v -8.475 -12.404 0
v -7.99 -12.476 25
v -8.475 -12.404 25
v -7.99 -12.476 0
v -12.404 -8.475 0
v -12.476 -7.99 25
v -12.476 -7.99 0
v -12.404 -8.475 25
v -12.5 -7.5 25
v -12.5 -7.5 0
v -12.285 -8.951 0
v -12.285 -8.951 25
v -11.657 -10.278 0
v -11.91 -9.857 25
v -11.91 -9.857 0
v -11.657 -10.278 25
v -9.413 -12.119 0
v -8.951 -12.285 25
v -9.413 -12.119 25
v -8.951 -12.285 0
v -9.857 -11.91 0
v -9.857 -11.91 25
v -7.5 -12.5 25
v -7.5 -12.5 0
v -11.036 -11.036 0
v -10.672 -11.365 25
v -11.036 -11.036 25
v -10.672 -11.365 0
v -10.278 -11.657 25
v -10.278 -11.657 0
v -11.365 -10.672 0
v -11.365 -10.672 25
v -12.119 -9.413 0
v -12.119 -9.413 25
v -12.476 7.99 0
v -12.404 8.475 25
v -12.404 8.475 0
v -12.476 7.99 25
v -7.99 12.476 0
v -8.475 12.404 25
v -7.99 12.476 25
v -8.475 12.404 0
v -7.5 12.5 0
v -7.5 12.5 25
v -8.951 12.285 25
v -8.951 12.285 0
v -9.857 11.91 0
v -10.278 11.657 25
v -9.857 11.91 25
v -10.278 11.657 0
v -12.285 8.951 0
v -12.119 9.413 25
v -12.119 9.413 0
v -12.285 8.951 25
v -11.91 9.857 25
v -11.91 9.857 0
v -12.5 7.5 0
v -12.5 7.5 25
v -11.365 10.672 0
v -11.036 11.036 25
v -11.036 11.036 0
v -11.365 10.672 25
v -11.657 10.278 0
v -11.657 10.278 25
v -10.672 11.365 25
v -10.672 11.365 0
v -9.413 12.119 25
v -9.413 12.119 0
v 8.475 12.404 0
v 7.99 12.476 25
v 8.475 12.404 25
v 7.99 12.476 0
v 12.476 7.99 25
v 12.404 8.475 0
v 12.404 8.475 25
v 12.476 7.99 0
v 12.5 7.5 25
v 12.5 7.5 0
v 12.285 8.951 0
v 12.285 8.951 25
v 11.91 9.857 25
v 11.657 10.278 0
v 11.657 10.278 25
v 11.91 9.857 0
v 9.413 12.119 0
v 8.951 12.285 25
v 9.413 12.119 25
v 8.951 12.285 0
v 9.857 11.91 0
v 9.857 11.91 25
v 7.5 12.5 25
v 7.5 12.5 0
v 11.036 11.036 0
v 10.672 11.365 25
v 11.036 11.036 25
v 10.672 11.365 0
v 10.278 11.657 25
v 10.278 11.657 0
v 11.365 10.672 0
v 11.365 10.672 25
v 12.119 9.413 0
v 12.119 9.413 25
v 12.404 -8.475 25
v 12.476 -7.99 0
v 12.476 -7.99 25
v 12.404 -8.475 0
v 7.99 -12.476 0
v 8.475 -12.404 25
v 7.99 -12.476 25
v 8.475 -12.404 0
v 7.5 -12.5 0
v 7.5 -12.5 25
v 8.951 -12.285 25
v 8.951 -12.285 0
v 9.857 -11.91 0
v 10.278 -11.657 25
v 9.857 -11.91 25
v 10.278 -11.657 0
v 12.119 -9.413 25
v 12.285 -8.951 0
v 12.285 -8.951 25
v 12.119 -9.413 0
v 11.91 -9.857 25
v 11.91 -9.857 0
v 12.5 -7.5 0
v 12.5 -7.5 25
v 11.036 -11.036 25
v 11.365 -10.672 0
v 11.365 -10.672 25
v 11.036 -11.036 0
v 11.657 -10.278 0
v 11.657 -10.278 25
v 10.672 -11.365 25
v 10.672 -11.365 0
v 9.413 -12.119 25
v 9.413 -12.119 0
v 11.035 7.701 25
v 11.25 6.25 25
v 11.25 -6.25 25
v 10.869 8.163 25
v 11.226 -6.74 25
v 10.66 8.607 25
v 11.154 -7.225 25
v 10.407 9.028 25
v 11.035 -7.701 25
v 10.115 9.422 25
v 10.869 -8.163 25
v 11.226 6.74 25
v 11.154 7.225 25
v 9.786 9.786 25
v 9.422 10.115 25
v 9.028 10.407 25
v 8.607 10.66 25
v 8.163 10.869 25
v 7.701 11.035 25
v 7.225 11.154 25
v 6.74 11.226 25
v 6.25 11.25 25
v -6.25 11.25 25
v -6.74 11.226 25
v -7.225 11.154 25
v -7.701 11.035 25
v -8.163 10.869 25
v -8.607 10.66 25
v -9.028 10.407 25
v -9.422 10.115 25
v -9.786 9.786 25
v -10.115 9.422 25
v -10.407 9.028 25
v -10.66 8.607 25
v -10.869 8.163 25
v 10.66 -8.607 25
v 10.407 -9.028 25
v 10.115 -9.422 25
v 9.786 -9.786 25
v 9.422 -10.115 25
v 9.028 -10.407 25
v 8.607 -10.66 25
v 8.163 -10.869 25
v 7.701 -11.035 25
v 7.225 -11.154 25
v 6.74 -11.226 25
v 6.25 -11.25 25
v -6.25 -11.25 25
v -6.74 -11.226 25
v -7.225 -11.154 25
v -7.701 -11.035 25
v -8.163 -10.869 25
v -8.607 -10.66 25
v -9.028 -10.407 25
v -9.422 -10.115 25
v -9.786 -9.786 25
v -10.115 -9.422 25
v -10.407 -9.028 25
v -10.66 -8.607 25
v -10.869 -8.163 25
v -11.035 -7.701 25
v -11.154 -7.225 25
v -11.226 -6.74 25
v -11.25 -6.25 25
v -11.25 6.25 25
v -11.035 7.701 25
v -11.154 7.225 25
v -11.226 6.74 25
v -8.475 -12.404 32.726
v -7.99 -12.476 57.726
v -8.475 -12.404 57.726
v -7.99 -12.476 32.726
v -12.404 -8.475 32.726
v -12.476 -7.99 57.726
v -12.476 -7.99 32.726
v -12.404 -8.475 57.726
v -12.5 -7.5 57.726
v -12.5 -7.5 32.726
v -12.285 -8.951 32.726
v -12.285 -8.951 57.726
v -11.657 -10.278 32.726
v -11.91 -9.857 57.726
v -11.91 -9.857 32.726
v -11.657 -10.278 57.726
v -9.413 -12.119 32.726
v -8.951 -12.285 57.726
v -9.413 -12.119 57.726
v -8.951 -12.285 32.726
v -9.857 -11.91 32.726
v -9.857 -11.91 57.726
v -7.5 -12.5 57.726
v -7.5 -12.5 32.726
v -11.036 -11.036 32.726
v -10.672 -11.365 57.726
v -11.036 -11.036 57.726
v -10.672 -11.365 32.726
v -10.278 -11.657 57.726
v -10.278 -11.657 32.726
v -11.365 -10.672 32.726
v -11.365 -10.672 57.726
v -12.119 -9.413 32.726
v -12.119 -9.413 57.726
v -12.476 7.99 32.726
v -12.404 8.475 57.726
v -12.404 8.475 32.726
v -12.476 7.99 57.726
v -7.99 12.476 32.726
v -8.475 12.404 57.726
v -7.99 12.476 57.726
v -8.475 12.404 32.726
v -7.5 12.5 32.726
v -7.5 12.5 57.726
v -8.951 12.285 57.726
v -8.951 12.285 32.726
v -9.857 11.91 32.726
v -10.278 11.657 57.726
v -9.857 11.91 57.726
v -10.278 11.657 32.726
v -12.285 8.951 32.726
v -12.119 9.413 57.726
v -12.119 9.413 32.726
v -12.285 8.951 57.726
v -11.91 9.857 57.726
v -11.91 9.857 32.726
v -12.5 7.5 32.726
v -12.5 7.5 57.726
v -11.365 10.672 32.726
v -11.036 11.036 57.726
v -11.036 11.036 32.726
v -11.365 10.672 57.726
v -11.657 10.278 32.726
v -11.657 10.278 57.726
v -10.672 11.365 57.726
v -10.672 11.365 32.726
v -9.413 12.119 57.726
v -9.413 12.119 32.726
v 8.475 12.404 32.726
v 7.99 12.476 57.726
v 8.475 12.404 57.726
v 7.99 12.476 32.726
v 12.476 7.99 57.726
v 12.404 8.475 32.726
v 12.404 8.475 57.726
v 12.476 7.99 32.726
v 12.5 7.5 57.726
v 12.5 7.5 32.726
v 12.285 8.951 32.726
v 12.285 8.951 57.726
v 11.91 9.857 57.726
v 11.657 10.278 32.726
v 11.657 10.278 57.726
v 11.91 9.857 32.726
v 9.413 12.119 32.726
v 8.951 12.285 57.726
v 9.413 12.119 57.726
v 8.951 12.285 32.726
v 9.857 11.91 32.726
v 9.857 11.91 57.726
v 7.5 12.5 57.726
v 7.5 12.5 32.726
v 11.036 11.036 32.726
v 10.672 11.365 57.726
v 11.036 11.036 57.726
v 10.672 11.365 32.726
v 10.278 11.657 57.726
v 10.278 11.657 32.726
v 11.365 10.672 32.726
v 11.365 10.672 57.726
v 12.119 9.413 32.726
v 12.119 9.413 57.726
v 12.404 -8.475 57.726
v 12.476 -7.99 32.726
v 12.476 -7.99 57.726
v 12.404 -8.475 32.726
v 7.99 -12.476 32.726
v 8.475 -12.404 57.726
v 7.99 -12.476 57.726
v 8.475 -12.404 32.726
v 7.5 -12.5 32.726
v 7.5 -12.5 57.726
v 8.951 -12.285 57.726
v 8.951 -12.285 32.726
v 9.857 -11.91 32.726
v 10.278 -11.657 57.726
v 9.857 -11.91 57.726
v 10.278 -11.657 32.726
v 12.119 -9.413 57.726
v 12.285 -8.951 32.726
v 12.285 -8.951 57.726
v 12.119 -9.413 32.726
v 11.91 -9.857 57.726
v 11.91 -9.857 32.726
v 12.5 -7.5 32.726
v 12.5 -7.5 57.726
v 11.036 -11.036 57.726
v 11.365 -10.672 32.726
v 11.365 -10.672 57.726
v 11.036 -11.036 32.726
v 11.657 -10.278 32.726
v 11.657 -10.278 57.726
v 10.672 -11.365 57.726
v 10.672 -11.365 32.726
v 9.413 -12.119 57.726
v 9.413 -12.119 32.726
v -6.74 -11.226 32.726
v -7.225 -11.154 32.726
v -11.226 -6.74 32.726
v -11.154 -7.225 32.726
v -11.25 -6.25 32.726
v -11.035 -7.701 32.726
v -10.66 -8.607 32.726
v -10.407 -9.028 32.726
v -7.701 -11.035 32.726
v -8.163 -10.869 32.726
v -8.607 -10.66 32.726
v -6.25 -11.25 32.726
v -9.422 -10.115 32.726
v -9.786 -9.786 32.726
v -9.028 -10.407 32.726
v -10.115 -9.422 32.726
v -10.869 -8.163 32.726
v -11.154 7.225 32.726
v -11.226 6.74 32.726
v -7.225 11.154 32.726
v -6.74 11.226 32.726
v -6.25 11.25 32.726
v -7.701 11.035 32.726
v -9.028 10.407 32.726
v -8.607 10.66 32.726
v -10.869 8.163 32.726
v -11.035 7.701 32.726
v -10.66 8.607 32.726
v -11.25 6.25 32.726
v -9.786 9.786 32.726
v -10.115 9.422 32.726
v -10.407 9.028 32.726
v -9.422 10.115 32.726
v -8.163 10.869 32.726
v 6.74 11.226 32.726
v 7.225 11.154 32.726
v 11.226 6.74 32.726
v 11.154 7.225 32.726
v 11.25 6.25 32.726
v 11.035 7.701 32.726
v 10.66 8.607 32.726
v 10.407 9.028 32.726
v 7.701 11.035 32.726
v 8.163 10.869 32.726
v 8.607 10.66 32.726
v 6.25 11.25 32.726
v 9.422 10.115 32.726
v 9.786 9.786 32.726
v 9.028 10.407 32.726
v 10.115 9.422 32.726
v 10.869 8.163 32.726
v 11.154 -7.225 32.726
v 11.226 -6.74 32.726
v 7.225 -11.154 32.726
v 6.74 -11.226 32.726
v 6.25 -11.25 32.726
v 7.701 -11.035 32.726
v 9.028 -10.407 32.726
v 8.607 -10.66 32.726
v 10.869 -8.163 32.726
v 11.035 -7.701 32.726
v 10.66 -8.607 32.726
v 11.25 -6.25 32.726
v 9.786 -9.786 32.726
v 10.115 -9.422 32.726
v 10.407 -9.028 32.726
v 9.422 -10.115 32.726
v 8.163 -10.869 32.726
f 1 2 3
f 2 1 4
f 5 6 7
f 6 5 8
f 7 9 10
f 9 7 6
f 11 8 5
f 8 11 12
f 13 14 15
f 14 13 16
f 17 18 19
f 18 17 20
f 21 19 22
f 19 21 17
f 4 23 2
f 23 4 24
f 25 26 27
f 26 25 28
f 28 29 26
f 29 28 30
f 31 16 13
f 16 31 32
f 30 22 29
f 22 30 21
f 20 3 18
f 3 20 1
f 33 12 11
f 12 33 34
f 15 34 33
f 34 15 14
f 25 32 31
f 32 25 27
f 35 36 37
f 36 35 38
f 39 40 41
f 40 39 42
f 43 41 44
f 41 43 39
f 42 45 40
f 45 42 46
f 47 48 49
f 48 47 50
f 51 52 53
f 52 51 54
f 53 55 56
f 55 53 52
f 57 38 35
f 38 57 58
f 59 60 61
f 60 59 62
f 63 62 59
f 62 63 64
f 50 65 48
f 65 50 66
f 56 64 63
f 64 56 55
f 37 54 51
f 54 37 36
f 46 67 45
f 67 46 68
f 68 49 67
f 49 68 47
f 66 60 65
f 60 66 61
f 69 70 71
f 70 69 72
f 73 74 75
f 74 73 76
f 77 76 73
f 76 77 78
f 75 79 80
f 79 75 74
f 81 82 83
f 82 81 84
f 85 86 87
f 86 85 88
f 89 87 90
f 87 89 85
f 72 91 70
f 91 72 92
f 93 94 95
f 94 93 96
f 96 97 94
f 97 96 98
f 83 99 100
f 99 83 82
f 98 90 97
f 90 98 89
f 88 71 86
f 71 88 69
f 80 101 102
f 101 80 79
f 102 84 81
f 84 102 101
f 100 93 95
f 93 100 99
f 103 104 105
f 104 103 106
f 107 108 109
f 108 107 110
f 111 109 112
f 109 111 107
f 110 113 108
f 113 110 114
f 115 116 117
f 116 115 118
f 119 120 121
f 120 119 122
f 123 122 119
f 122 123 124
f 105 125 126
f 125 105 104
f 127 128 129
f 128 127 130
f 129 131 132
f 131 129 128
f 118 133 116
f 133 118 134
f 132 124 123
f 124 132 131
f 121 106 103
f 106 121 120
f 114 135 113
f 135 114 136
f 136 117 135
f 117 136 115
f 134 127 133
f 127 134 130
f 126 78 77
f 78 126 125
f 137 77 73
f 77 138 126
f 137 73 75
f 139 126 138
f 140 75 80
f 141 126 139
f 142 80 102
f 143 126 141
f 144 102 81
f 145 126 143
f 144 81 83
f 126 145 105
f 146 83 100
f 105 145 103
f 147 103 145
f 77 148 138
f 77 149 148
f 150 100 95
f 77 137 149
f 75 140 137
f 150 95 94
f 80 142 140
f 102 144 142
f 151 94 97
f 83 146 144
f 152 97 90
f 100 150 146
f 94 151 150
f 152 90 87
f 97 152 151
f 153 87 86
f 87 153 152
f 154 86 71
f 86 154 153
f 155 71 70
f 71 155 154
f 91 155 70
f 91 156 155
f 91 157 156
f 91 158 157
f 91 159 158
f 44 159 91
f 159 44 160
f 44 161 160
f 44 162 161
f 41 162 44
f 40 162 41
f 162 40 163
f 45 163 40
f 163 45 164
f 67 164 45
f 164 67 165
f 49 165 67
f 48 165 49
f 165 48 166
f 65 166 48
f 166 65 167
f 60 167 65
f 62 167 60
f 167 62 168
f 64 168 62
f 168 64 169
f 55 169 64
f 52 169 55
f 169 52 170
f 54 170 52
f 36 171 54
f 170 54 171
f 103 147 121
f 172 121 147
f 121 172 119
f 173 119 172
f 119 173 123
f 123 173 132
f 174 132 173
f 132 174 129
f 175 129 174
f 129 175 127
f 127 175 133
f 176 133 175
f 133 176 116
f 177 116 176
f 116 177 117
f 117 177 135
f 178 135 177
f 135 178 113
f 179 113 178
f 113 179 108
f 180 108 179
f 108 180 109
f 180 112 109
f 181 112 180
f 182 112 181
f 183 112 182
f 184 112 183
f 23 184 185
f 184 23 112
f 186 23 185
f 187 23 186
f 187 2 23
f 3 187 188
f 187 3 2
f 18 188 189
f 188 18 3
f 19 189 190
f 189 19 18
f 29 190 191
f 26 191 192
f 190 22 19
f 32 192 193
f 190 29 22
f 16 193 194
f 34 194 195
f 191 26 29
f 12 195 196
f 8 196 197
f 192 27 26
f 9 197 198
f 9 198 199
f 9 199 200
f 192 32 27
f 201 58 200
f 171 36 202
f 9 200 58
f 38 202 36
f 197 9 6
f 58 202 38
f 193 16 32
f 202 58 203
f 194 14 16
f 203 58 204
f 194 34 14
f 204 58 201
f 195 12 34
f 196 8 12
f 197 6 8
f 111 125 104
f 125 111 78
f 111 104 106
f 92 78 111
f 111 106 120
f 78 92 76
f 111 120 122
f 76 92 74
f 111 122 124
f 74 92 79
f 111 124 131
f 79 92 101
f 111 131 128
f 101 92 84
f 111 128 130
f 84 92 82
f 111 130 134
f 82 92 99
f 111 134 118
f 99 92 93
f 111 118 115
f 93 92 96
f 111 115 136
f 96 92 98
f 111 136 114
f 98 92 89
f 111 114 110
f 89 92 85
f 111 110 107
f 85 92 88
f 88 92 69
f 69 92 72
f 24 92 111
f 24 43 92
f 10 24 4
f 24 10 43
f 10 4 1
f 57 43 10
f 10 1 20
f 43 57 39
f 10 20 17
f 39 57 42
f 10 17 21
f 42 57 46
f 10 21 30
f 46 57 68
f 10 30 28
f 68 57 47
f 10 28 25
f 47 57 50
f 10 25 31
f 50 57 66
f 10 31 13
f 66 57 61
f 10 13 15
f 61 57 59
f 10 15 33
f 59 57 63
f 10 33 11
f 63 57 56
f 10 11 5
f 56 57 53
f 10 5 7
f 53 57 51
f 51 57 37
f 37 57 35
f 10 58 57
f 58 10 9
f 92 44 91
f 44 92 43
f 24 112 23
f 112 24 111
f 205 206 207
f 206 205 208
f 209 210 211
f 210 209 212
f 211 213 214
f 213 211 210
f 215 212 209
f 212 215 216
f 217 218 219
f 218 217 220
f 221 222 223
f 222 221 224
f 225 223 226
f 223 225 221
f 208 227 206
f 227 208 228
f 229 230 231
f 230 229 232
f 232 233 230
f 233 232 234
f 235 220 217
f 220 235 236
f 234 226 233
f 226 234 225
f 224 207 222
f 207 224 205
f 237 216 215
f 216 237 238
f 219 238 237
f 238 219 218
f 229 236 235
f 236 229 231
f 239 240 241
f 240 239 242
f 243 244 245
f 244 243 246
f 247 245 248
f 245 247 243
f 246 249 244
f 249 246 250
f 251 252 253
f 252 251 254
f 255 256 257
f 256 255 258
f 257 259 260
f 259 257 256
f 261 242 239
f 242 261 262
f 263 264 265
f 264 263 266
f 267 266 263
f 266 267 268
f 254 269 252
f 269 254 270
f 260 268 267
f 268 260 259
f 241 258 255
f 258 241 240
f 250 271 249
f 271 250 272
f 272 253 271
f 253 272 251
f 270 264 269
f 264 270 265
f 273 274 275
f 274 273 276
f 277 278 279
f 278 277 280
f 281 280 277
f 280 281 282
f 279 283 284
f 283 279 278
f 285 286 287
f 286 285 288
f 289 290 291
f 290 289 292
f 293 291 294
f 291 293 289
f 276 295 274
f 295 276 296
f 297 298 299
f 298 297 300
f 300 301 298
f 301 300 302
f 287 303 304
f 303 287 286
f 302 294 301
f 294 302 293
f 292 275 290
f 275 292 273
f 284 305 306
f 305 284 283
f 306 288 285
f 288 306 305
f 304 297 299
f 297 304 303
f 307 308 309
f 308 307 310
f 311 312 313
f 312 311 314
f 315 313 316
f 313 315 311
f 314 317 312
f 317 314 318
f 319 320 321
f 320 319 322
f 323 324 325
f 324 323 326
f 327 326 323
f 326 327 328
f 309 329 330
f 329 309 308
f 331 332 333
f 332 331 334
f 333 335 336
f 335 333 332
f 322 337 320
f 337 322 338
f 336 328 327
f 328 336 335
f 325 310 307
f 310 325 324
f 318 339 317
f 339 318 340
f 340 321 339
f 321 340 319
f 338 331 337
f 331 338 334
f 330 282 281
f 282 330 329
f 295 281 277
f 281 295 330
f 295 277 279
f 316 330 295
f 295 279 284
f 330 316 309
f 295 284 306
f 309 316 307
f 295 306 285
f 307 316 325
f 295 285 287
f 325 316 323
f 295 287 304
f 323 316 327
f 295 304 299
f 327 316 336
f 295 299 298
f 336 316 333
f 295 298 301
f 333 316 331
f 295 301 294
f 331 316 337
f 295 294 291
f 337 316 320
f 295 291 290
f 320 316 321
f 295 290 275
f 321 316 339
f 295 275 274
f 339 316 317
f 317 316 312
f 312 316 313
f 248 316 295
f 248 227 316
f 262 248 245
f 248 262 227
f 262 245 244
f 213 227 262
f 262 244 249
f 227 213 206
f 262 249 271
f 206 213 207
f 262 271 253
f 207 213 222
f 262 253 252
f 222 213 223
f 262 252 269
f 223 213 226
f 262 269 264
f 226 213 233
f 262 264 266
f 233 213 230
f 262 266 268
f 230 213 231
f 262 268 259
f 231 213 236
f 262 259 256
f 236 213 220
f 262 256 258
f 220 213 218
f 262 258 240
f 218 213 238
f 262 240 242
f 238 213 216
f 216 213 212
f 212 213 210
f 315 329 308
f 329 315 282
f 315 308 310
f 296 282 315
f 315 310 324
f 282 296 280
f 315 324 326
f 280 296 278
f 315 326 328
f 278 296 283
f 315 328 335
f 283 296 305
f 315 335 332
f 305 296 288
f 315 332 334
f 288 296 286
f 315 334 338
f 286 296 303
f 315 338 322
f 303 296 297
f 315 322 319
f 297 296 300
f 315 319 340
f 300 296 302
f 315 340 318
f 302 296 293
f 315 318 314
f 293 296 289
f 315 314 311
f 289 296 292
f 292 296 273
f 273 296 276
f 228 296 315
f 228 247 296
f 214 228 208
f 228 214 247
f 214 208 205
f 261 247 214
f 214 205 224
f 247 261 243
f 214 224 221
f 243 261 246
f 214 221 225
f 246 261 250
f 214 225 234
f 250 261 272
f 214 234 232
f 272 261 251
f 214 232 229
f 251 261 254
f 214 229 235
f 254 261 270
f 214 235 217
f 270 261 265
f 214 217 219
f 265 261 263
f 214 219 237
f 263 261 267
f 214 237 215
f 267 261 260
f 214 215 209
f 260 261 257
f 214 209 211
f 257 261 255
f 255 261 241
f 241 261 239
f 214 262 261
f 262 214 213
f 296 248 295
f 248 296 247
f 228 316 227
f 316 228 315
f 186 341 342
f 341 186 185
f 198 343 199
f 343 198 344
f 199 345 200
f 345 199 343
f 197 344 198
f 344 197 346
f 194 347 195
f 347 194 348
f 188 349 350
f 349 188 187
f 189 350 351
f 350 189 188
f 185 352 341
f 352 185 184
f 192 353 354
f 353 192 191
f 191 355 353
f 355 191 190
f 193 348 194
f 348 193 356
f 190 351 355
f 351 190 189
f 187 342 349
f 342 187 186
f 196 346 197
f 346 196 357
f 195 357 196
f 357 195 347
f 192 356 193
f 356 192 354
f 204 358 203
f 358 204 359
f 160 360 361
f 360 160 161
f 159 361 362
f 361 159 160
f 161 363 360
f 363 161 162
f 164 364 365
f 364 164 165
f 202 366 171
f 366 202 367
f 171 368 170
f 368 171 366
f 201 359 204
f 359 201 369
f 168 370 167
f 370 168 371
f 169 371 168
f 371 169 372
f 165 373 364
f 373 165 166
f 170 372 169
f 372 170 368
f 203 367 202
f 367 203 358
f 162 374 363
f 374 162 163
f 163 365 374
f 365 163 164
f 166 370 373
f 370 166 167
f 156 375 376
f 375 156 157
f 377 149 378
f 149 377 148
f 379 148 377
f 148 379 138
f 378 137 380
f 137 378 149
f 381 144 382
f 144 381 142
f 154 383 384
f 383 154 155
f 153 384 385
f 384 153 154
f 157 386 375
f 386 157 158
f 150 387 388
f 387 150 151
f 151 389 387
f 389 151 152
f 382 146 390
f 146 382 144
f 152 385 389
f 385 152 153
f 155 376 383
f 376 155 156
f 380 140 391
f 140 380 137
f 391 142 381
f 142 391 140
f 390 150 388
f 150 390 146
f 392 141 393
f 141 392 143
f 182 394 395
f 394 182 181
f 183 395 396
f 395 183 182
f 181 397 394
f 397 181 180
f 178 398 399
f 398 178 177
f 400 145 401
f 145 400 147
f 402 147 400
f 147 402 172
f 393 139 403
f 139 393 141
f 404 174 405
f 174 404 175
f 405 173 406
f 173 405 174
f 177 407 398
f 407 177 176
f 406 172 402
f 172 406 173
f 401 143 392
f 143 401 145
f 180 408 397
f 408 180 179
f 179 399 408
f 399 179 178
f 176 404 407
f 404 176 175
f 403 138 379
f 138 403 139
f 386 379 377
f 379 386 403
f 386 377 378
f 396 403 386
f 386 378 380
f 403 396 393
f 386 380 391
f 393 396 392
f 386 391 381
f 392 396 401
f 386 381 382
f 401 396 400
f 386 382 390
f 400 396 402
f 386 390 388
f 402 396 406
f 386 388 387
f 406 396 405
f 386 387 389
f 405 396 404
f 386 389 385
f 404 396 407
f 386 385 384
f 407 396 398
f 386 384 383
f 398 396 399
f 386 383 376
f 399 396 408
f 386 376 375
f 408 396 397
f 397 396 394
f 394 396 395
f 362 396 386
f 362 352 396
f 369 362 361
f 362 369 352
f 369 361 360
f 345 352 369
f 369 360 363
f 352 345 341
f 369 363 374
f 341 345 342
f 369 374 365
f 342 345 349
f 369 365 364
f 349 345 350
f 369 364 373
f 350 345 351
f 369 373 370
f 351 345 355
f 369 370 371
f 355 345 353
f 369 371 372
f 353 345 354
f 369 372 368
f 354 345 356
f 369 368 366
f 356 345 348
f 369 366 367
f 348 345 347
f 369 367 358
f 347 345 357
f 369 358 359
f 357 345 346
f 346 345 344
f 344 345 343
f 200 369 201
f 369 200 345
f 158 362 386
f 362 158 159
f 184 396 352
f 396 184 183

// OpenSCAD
$fn=64;
union(){union(){translate(v = [0, 0, 32.726])
difference(){translate(v = [-12.500, -12.500])
cube(size = [25, 25, 25]);
translate(v = [-12.500, -12.500])
union(){rotate(a = [0, 0, 180])
translate(v = [-5.000, -5.000])
difference(){translate(v = [0, 0, -0.010])
cube(size = [10.000, 10.000, 25.020]);
translate(v = [0, 0, -0.020])
cylinder(r = 5.000, h = 25.040, $fn = 64);
}
rotate(a = [0, 0, 90])
translate(v = [20.000, -5.000])
difference(){translate(v = [0, 0, -0.010])
cube(size = [10.000, 10.000, 25.020]);
translate(v = [0, 0, -0.020])
cylinder(r = 5.000, h = 25.040, $fn = 64);
}
translate(v = [20.000, 20.000])
difference(){translate(v = [0, 0, -0.010])
cube(size = [10.000, 10.000, 25.020]);
translate(v = [0, 0, -0.020])
cylinder(r = 5.000, h = 25.040, $fn = 64);
}
rotate(a = [0, 0, -90])
translate(v = [-5.000, 20.000])
difference(){translate(v = [0, 0, -0.010])
cube(size = [10.000, 10.000, 25.020]);
translate(v = [0, 0, -0.020])
cylinder(r = 5.000, h = 25.040, $fn = 64);
}
}
}
difference(){translate(v = [-12.500, -12.500])
cube(size = [25, 25, 25]);
translate(v = [-12.500, -12.500])
union(){rotate(a = [0, 0, 180])
translate(v = [-5.000, -5.000])
difference(){translate(v = [0, 0, -0.010])
cube(size = [10.000, 10.000, 25.020]);
translate(v = [0, 0, -0.020])
cylinder(r = 5.000, h = 25.040, $fn = 64);
}
rotate(a = [0, 0, 90])
translate(v = [20.000, -5.000])
difference(){translate(v = [0, 0, -0.010])
cube(size = [10.000, 10.000, 25.020]);
translate(v = [0, 0, -0.020])
cylinder(r = 5.000, h = 25.040, $fn = 64);
}
translate(v = [20.000, 20.000])
difference(){translate(v = [0, 0, -0.010])
cube(size = [10.000, 10.000, 25.020]);
translate(v = [0, 0, -0.020])
cylinder(r = 5.000, h = 25.040, $fn = 64);
}
rotate(a = [0, 0, -90])
translate(v = [-5.000, 20.000])
difference(){translate(v = [0, 0, -0.010])
cube(size = [10.000, 10.000, 25.020]);
translate(v = [0, 0, -0.020])
cylinder(r = 5.000, h = 25.040, $fn = 64);
}
}
}
translate(v = [0, 0, 25])
difference(){translate(v = [-11.250, -11.250])
cube(size = [22.500, 22.500, 7.726]);
translate(v = [-11.250, -11.250])
union(){rotate(a = [0, 0, 180])
translate(v = [-5.000, -5.000])
difference(){translate(v = [0, 0, -0.010])
cube(size = [10.000, 10.000, 7.746]);
translate(v = [0, 0, -0.020])
cylinder(r = 5.000, h = 7.766, $fn = 64);
}
rotate(a = [0, 0, 90])
translate(v = [17.500, -5.000])
difference(){translate(v = [0, 0, -0.010])
cube(size = [10.000, 10.000, 7.746]);
translate(v = [0, 0, -0.020])
cylinder(r = 5.000, h = 7.766, $fn = 64);
}
translate(v = [17.500, 17.500])
difference(){translate(v = [0, 0, -0.010])
cube(size = [10.000, 10.000, 7.746]);
translate(v = [0, 0, -0.020])
cylinder(r = 5.000, h = 7.766, $fn = 64);
}
rotate(a = [0, 0, -90])
translate(v = [-5.000, 17.500])
difference(){translate(v = [0, 0, -0.010])
cube(size = [10.000, 10.000, 7.746]);
translate(v = [0, 0, -0.020])
cylinder(r = 5.000, h = 7.766, $fn = 64);
}
}
}
}
}
